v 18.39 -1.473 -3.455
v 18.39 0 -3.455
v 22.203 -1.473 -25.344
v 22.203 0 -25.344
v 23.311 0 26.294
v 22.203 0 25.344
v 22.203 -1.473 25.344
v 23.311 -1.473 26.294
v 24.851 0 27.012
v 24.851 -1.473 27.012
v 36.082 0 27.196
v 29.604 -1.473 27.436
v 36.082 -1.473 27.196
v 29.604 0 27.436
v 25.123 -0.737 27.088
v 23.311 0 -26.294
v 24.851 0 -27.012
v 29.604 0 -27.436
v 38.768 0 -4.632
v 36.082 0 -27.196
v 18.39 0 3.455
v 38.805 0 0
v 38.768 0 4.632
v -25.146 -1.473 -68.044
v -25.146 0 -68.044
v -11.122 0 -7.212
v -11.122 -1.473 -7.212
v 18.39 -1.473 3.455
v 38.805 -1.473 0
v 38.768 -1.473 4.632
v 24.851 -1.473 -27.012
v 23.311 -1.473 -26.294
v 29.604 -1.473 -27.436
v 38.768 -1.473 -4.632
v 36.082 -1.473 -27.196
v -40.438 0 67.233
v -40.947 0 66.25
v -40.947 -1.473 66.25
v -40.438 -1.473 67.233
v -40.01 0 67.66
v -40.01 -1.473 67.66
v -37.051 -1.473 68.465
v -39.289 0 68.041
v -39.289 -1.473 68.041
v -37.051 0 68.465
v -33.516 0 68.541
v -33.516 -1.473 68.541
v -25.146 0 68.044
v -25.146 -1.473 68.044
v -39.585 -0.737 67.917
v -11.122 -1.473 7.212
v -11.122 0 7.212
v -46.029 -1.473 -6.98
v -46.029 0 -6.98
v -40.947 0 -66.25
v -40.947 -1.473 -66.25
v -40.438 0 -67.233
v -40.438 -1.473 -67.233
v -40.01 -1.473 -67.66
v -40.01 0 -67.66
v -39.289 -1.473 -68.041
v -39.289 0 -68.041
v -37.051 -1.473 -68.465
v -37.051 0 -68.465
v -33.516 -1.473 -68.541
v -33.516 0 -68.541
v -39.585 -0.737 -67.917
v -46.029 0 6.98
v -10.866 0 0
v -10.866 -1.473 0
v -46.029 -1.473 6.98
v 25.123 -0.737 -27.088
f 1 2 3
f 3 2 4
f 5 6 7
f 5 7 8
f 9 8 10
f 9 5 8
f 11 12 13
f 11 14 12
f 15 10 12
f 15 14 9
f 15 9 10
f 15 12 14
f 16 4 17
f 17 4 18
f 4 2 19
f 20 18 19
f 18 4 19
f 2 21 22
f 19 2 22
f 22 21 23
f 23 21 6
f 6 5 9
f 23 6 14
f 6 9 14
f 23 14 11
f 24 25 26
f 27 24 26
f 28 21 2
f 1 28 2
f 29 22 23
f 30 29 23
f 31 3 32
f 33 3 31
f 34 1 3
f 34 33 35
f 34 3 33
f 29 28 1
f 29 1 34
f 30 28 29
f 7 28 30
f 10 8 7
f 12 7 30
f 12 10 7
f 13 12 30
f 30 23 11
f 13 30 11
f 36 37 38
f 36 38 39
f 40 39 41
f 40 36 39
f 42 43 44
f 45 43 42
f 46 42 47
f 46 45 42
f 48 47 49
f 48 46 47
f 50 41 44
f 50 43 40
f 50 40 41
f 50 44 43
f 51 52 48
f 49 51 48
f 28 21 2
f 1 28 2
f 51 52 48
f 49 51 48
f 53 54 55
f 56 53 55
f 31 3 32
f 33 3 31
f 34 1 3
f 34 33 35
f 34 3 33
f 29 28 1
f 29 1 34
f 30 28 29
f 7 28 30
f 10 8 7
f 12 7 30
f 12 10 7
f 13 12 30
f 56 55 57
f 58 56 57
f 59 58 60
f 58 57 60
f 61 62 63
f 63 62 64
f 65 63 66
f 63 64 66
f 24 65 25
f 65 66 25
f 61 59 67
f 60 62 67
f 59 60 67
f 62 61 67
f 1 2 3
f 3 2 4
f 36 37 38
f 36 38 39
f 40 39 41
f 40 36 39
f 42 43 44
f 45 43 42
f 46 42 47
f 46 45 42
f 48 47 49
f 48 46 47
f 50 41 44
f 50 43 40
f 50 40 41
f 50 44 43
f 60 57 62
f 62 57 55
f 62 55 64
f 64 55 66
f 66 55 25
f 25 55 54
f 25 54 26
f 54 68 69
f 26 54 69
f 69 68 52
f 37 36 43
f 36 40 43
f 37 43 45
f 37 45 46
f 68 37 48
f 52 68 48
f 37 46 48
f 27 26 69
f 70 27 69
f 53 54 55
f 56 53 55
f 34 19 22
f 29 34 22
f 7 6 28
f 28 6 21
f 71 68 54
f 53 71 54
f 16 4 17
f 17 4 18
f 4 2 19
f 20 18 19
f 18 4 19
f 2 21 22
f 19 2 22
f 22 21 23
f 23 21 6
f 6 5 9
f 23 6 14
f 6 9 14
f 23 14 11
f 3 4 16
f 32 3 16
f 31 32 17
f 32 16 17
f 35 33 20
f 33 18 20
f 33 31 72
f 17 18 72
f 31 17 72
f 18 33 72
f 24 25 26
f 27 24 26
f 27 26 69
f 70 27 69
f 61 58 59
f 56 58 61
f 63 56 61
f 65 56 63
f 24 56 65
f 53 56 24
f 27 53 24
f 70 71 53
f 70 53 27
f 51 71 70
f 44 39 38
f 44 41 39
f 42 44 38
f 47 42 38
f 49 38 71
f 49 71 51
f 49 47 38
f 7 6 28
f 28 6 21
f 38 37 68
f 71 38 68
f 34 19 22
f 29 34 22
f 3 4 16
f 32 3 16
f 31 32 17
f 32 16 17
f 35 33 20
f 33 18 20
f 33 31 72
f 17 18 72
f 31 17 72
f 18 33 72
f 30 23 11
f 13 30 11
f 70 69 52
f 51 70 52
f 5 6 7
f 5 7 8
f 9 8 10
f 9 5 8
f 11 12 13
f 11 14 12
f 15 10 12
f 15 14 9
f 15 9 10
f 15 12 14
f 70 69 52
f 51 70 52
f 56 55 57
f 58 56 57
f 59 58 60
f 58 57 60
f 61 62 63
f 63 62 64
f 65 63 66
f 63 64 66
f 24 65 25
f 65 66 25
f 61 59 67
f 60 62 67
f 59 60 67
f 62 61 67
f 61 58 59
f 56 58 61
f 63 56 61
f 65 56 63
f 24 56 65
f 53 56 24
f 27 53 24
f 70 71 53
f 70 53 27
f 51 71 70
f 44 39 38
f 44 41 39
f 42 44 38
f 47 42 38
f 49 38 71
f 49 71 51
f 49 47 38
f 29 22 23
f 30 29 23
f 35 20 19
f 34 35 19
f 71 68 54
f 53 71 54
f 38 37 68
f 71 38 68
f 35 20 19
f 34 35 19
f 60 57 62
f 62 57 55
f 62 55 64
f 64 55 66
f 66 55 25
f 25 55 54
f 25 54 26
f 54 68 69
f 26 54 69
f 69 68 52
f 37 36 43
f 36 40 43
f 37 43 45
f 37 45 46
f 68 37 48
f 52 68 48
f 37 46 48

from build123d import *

# Parameters (mm, degrees)
F1_DEPTH = 1.4732
F2_DEPTH = 1.4732


with BuildPart() as f1:
    # F0 (on Front) → F1 (new body)
    with BuildSketch(Plane.XZ):
        with BuildLine():
            Line((-46.0291467607, 6.9798850454), (-46.0291467607, 0))
            Line((-46.0291467607, 0), (-46.0291467607, -6.9798850454))
            Line((-46.0291467607, -6.9798850454), (-40.9467443824, -66.2495791912))
            add(Edge.make_bspline(
                [(-40.9467443824, -66.2495791912), (-40.6883318068, -66.8803661985), (-39.7606656869, -69.1448060552), (-31.2709880581, -68.5055704966), (-25.1462124288, -68.0444017053)],
                knots=[0, 0, 0, 0, 0.2785620495, 1, 1, 1, 1], degree=3))
            Line((-25.1462124288, -68.0444017053), (-11.1219026148, -7.2120078839))
            Line((-11.1219026148, -7.2120078839), (-10.8663532883, 0))
            Line((-10.8663532883, 0), (-11.1219026148, 7.2120078839))
            Line((-11.1219026148, 7.2120078839), (-25.1462124288, 68.0444017053))
            add(Edge.make_bspline(
                [(-40.9467443824, 66.2495791912), (-40.6883318068, 66.8803661985), (-39.7606656869, 69.1448060552), (-31.2709880581, 68.5055704966), (-25.1462124288, 68.0444017053)],
                knots=[0, 0, 0, 0, 0.2785620495, 1, 1, 1, 1], degree=3))
            Line((-40.9467443824, 66.2495791912), (-46.0291467607, 6.9798850454))
        make_face()
    extrude(amount=F1_DEPTH)


with BuildPart() as f1b:
    # F0 (on Front) → F1, piece 2 (new body)
    with BuildSketch(Plane.XZ):
        with BuildLine():
            Line((18.3902941644, 3.454687075), (18.3902941644, 0))
            Line((18.3902941644, 0), (18.3902941644, -3.454687075))
            Line((18.3902941644, -3.454687075), (22.2026370466, -25.3443550318))
            add(Edge.make_bspline(
                [(22.2026370466, -25.3443550318), (22.8817845256, -26.070078438), (25.3457400214, -27.9325335411), (31.5443602575, -27.338116992), (36.0823087394, -27.1957162768)],
                knots=[0, 0, 0, 0, 0.3577750446, 1, 1, 1, 1], degree=3))
            Line((36.0823087394, -27.1957162768), (38.7684330344, -4.6322611161))
            Line((38.7684330344, -4.6322611161), (38.8048477471, 0))
            Line((38.8048477471, 0), (38.7684330344, 4.6322611161))
            Line((38.7684330344, 4.6322611161), (36.0823087394, 27.1957162768))
            add(Edge.make_bspline(
                [(22.2026370466, 25.3443550318), (22.8817845256, 26.070078438), (25.3457400214, 27.9325335411), (31.5443602575, 27.338116992), (36.0823087394, 27.1957162768)],
                knots=[0, 0, 0, 0, 0.3577750446, 1, 1, 1, 1], degree=3))
            Line((22.2026370466, 25.3443550318), (18.3902941644, 3.454687075))
        make_face()
    extrude(amount=F1_DEPTH)


with BuildPart() as f2:
    # F0 (on Front) → F2 (new body)
    with BuildSketch(Plane.XZ):
        with BuildLine():
            Line((-46.0291467607, 6.9798850454), (-46.0291467607, 0))
            Line((-46.0291467607, 0), (-46.0291467607, -6.9798850454))
            Line((-46.0291467607, -6.9798850454), (-40.9467443824, -66.2495791912))
            add(Edge.make_bspline(
                [(-40.9467443824, -66.2495791912), (-40.6883318068, -66.8803661985), (-39.7606656869, -69.1448060552), (-31.2709880581, -68.5055704966), (-25.1462124288, -68.0444017053)],
                knots=[0, 0, 0, 0, 0.2785620495, 1, 1, 1, 1], degree=3))
            Line((-25.1462124288, -68.0444017053), (-11.1219026148, -7.2120078839))
            Line((-11.1219026148, -7.2120078839), (-10.8663532883, 0))
            Line((-10.8663532883, 0), (-11.1219026148, 7.2120078839))
            Line((-11.1219026148, 7.2120078839), (-25.1462124288, 68.0444017053))
            add(Edge.make_bspline(
                [(-40.9467443824, 66.2495791912), (-40.6883318068, 66.8803661985), (-39.7606656869, 69.1448060552), (-31.2709880581, 68.5055704966), (-25.1462124288, 68.0444017053)],
                knots=[0, 0, 0, 0, 0.2785620495, 1, 1, 1, 1], degree=3))
            Line((-40.9467443824, 66.2495791912), (-46.0291467607, 6.9798850454))
        make_face()
    extrude(amount=F2_DEPTH)


with BuildPart() as f2b:
    # F0 (on Front) → F2, piece 2 (new body)
    with BuildSketch(Plane.XZ):
        with BuildLine():
            Line((18.3902941644, 3.454687075), (18.3902941644, 0))
            Line((18.3902941644, 0), (18.3902941644, -3.454687075))
            Line((18.3902941644, -3.454687075), (22.2026370466, -25.3443550318))
            add(Edge.make_bspline(
                [(22.2026370466, -25.3443550318), (22.8817845256, -26.070078438), (25.3457400214, -27.9325335411), (31.5443602575, -27.338116992), (36.0823087394, -27.1957162768)],
                knots=[0, 0, 0, 0, 0.3577750446, 1, 1, 1, 1], degree=3))
            Line((36.0823087394, -27.1957162768), (38.7684330344, -4.6322611161))
            Line((38.7684330344, -4.6322611161), (38.8048477471, 0))
            Line((38.8048477471, 0), (38.7684330344, 4.6322611161))
            Line((38.7684330344, 4.6322611161), (36.0823087394, 27.1957162768))
            add(Edge.make_bspline(
                [(22.2026370466, 25.3443550318), (22.8817845256, 26.070078438), (25.3457400214, 27.9325335411), (31.5443602575, 27.338116992), (36.0823087394, 27.1957162768)],
                knots=[0, 0, 0, 0, 0.3577750446, 1, 1, 1, 1], degree=3))
            Line((22.2026370466, 25.3443550318), (18.3902941644, 3.454687075))
        make_face()
    extrude(amount=F2_DEPTH)


solid = Compound([f1.part, f1b.part, f2.part, f2b.part])
